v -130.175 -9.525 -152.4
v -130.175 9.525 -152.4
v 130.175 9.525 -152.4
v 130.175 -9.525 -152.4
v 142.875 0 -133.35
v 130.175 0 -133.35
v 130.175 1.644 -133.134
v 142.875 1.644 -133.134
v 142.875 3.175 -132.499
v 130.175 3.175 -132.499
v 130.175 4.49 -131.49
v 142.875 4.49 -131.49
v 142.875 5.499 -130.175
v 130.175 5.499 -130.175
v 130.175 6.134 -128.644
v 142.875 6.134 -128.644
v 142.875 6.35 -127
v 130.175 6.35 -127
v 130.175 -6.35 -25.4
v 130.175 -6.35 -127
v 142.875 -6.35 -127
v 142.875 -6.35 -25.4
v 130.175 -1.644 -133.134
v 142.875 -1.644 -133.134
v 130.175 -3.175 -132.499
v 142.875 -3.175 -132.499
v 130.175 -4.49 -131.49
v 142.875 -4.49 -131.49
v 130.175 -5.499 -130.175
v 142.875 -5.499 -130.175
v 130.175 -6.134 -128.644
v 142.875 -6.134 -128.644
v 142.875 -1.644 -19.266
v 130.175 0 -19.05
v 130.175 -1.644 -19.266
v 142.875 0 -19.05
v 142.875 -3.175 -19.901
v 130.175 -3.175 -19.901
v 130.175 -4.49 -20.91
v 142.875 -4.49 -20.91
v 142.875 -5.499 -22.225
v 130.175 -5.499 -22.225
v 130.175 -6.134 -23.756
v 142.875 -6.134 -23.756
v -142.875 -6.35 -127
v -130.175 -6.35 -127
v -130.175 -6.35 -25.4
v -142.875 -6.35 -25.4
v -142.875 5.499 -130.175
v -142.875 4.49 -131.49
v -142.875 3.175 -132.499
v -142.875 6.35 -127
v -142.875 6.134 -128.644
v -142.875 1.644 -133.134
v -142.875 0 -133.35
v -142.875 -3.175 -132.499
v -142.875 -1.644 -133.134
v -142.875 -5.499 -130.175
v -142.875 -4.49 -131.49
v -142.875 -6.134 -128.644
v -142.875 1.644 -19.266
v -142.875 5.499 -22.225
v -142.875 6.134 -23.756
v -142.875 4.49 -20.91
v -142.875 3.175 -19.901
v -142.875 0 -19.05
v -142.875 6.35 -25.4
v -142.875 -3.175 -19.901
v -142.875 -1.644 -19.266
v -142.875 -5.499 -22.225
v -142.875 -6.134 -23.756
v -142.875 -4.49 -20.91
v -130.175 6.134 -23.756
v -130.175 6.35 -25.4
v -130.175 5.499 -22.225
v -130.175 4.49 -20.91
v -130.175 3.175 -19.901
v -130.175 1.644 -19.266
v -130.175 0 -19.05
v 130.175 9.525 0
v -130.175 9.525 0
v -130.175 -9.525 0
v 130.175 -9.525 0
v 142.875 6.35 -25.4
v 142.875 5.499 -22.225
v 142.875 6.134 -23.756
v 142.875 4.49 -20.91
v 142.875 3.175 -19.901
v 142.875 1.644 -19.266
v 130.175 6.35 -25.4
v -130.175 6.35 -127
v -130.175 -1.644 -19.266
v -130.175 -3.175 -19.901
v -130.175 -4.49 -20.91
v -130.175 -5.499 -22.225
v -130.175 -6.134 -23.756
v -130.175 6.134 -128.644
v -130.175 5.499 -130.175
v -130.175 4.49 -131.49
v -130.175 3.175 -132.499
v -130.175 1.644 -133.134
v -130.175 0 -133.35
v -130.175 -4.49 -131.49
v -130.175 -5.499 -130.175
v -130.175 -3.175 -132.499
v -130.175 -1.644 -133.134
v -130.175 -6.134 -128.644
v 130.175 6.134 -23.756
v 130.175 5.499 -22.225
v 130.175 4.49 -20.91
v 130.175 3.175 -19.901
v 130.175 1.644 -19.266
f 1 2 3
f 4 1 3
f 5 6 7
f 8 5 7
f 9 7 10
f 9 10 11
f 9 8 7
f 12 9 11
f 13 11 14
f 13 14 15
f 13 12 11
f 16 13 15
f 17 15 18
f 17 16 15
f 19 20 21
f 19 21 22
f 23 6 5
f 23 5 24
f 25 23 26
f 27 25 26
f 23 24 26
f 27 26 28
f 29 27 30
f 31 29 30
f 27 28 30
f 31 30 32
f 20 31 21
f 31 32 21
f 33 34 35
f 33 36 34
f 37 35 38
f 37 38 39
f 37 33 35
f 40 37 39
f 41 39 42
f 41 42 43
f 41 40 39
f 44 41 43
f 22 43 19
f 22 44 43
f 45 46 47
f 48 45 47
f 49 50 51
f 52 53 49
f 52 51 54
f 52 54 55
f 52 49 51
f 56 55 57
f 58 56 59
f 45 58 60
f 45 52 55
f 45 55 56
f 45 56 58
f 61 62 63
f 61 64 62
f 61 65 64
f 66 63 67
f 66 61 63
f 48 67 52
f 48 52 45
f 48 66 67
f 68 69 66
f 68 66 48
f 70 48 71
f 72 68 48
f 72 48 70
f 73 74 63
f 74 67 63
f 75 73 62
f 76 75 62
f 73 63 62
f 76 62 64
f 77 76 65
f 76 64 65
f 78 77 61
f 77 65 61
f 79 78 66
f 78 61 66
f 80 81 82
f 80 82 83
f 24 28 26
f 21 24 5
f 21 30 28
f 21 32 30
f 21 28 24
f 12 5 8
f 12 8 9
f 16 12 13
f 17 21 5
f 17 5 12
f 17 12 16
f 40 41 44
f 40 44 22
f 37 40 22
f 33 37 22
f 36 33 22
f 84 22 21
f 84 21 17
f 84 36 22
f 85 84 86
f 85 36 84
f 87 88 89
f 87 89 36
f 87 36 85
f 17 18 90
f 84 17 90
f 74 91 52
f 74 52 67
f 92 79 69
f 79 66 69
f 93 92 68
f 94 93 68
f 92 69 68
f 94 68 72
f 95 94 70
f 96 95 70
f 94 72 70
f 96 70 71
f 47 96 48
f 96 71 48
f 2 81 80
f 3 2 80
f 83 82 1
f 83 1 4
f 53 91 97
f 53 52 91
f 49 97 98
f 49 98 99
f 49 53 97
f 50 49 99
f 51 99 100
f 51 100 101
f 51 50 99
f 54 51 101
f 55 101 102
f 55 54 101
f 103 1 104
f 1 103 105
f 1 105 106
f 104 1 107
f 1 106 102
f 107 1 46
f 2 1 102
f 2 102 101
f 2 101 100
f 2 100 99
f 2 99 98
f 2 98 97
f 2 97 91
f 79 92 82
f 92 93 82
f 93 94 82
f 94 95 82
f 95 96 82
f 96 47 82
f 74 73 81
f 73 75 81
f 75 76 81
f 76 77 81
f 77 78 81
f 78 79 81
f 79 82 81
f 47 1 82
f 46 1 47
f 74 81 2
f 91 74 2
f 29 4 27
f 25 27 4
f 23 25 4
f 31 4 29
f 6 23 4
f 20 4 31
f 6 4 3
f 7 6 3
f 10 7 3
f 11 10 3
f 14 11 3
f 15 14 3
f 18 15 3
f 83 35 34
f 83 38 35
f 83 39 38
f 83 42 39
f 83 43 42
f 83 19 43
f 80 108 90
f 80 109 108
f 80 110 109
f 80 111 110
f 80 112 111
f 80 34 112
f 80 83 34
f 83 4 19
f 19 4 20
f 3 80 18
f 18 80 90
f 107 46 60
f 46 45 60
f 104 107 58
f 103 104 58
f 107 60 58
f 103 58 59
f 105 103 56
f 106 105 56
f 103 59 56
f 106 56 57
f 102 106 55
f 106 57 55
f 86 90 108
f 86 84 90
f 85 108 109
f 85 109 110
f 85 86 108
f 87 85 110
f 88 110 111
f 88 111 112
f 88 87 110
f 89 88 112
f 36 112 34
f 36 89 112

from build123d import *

# Parameters (mm, degrees)
F0_W     = 260.35
F0_H     = 19.05
F1_DEPTH = 152.4
F2_W     = 12.7
F2_H     = 114.3
F3_DEPTH = 12.7
F4_R     = 6.34999
F5_W     = 12.7
F5_H     = 114.3
F6_DEPTH = 12.7
F7_R     = 6.34999


# Not quite as in the source:
# - a fillet or chamfer is up to 0.001 mm smaller than in the source, because OpenCascade refuses the exact size


with BuildPart() as f1:
    # F0 (on Top) → F1 (new body)
    with BuildSketch(Plane.XY):
        Rectangle(F0_W, F0_H)
    extrude(amount=-F1_DEPTH)

    # F2 (on face) → F3 (join)
    with BuildSketch(Plane(origin=(-130.175, 0, 0), x_dir=(0, -1, 0), z_dir=(-1, 0, 0))):
        with Locations((0, -76.2)):
            Rectangle(F2_W, F2_H)
    extrude(amount=F3_DEPTH)

    # F4 (radius 6.35 in the source; OpenCascade refuses exactly that, so slightly less here)
    f4_edges = [f1.edges().sort_by_distance(p)[0] for p in [
        (-136.525, 6.35, -19.05),
        (-136.525, -6.35, -19.05),
        (-136.525, -6.35, -133.35),
        (-136.525, 6.35, -133.35),
    ]]
    fillet(f4_edges, radius=F4_R)

    # F5 (on face) → F6 (join)
    with BuildSketch(Plane.YZ.offset(130.175)):
        with Locations((0, -76.2)):
            Rectangle(F5_W, F5_H)
    extrude(amount=F6_DEPTH)

    # F7 (radius 6.35 in the source; OpenCascade refuses exactly that, so slightly less here)
    f7_edges = [f1.edges().sort_by_distance(p)[0] for p in [
        (136.525, -6.35, -19.05),
        (136.525, 6.35, -19.05),
        (136.525, 6.35, -133.35),
        (136.525, -6.35, -133.35),
    ]]
    fillet(f7_edges, radius=F7_R)


solid = f1.part
